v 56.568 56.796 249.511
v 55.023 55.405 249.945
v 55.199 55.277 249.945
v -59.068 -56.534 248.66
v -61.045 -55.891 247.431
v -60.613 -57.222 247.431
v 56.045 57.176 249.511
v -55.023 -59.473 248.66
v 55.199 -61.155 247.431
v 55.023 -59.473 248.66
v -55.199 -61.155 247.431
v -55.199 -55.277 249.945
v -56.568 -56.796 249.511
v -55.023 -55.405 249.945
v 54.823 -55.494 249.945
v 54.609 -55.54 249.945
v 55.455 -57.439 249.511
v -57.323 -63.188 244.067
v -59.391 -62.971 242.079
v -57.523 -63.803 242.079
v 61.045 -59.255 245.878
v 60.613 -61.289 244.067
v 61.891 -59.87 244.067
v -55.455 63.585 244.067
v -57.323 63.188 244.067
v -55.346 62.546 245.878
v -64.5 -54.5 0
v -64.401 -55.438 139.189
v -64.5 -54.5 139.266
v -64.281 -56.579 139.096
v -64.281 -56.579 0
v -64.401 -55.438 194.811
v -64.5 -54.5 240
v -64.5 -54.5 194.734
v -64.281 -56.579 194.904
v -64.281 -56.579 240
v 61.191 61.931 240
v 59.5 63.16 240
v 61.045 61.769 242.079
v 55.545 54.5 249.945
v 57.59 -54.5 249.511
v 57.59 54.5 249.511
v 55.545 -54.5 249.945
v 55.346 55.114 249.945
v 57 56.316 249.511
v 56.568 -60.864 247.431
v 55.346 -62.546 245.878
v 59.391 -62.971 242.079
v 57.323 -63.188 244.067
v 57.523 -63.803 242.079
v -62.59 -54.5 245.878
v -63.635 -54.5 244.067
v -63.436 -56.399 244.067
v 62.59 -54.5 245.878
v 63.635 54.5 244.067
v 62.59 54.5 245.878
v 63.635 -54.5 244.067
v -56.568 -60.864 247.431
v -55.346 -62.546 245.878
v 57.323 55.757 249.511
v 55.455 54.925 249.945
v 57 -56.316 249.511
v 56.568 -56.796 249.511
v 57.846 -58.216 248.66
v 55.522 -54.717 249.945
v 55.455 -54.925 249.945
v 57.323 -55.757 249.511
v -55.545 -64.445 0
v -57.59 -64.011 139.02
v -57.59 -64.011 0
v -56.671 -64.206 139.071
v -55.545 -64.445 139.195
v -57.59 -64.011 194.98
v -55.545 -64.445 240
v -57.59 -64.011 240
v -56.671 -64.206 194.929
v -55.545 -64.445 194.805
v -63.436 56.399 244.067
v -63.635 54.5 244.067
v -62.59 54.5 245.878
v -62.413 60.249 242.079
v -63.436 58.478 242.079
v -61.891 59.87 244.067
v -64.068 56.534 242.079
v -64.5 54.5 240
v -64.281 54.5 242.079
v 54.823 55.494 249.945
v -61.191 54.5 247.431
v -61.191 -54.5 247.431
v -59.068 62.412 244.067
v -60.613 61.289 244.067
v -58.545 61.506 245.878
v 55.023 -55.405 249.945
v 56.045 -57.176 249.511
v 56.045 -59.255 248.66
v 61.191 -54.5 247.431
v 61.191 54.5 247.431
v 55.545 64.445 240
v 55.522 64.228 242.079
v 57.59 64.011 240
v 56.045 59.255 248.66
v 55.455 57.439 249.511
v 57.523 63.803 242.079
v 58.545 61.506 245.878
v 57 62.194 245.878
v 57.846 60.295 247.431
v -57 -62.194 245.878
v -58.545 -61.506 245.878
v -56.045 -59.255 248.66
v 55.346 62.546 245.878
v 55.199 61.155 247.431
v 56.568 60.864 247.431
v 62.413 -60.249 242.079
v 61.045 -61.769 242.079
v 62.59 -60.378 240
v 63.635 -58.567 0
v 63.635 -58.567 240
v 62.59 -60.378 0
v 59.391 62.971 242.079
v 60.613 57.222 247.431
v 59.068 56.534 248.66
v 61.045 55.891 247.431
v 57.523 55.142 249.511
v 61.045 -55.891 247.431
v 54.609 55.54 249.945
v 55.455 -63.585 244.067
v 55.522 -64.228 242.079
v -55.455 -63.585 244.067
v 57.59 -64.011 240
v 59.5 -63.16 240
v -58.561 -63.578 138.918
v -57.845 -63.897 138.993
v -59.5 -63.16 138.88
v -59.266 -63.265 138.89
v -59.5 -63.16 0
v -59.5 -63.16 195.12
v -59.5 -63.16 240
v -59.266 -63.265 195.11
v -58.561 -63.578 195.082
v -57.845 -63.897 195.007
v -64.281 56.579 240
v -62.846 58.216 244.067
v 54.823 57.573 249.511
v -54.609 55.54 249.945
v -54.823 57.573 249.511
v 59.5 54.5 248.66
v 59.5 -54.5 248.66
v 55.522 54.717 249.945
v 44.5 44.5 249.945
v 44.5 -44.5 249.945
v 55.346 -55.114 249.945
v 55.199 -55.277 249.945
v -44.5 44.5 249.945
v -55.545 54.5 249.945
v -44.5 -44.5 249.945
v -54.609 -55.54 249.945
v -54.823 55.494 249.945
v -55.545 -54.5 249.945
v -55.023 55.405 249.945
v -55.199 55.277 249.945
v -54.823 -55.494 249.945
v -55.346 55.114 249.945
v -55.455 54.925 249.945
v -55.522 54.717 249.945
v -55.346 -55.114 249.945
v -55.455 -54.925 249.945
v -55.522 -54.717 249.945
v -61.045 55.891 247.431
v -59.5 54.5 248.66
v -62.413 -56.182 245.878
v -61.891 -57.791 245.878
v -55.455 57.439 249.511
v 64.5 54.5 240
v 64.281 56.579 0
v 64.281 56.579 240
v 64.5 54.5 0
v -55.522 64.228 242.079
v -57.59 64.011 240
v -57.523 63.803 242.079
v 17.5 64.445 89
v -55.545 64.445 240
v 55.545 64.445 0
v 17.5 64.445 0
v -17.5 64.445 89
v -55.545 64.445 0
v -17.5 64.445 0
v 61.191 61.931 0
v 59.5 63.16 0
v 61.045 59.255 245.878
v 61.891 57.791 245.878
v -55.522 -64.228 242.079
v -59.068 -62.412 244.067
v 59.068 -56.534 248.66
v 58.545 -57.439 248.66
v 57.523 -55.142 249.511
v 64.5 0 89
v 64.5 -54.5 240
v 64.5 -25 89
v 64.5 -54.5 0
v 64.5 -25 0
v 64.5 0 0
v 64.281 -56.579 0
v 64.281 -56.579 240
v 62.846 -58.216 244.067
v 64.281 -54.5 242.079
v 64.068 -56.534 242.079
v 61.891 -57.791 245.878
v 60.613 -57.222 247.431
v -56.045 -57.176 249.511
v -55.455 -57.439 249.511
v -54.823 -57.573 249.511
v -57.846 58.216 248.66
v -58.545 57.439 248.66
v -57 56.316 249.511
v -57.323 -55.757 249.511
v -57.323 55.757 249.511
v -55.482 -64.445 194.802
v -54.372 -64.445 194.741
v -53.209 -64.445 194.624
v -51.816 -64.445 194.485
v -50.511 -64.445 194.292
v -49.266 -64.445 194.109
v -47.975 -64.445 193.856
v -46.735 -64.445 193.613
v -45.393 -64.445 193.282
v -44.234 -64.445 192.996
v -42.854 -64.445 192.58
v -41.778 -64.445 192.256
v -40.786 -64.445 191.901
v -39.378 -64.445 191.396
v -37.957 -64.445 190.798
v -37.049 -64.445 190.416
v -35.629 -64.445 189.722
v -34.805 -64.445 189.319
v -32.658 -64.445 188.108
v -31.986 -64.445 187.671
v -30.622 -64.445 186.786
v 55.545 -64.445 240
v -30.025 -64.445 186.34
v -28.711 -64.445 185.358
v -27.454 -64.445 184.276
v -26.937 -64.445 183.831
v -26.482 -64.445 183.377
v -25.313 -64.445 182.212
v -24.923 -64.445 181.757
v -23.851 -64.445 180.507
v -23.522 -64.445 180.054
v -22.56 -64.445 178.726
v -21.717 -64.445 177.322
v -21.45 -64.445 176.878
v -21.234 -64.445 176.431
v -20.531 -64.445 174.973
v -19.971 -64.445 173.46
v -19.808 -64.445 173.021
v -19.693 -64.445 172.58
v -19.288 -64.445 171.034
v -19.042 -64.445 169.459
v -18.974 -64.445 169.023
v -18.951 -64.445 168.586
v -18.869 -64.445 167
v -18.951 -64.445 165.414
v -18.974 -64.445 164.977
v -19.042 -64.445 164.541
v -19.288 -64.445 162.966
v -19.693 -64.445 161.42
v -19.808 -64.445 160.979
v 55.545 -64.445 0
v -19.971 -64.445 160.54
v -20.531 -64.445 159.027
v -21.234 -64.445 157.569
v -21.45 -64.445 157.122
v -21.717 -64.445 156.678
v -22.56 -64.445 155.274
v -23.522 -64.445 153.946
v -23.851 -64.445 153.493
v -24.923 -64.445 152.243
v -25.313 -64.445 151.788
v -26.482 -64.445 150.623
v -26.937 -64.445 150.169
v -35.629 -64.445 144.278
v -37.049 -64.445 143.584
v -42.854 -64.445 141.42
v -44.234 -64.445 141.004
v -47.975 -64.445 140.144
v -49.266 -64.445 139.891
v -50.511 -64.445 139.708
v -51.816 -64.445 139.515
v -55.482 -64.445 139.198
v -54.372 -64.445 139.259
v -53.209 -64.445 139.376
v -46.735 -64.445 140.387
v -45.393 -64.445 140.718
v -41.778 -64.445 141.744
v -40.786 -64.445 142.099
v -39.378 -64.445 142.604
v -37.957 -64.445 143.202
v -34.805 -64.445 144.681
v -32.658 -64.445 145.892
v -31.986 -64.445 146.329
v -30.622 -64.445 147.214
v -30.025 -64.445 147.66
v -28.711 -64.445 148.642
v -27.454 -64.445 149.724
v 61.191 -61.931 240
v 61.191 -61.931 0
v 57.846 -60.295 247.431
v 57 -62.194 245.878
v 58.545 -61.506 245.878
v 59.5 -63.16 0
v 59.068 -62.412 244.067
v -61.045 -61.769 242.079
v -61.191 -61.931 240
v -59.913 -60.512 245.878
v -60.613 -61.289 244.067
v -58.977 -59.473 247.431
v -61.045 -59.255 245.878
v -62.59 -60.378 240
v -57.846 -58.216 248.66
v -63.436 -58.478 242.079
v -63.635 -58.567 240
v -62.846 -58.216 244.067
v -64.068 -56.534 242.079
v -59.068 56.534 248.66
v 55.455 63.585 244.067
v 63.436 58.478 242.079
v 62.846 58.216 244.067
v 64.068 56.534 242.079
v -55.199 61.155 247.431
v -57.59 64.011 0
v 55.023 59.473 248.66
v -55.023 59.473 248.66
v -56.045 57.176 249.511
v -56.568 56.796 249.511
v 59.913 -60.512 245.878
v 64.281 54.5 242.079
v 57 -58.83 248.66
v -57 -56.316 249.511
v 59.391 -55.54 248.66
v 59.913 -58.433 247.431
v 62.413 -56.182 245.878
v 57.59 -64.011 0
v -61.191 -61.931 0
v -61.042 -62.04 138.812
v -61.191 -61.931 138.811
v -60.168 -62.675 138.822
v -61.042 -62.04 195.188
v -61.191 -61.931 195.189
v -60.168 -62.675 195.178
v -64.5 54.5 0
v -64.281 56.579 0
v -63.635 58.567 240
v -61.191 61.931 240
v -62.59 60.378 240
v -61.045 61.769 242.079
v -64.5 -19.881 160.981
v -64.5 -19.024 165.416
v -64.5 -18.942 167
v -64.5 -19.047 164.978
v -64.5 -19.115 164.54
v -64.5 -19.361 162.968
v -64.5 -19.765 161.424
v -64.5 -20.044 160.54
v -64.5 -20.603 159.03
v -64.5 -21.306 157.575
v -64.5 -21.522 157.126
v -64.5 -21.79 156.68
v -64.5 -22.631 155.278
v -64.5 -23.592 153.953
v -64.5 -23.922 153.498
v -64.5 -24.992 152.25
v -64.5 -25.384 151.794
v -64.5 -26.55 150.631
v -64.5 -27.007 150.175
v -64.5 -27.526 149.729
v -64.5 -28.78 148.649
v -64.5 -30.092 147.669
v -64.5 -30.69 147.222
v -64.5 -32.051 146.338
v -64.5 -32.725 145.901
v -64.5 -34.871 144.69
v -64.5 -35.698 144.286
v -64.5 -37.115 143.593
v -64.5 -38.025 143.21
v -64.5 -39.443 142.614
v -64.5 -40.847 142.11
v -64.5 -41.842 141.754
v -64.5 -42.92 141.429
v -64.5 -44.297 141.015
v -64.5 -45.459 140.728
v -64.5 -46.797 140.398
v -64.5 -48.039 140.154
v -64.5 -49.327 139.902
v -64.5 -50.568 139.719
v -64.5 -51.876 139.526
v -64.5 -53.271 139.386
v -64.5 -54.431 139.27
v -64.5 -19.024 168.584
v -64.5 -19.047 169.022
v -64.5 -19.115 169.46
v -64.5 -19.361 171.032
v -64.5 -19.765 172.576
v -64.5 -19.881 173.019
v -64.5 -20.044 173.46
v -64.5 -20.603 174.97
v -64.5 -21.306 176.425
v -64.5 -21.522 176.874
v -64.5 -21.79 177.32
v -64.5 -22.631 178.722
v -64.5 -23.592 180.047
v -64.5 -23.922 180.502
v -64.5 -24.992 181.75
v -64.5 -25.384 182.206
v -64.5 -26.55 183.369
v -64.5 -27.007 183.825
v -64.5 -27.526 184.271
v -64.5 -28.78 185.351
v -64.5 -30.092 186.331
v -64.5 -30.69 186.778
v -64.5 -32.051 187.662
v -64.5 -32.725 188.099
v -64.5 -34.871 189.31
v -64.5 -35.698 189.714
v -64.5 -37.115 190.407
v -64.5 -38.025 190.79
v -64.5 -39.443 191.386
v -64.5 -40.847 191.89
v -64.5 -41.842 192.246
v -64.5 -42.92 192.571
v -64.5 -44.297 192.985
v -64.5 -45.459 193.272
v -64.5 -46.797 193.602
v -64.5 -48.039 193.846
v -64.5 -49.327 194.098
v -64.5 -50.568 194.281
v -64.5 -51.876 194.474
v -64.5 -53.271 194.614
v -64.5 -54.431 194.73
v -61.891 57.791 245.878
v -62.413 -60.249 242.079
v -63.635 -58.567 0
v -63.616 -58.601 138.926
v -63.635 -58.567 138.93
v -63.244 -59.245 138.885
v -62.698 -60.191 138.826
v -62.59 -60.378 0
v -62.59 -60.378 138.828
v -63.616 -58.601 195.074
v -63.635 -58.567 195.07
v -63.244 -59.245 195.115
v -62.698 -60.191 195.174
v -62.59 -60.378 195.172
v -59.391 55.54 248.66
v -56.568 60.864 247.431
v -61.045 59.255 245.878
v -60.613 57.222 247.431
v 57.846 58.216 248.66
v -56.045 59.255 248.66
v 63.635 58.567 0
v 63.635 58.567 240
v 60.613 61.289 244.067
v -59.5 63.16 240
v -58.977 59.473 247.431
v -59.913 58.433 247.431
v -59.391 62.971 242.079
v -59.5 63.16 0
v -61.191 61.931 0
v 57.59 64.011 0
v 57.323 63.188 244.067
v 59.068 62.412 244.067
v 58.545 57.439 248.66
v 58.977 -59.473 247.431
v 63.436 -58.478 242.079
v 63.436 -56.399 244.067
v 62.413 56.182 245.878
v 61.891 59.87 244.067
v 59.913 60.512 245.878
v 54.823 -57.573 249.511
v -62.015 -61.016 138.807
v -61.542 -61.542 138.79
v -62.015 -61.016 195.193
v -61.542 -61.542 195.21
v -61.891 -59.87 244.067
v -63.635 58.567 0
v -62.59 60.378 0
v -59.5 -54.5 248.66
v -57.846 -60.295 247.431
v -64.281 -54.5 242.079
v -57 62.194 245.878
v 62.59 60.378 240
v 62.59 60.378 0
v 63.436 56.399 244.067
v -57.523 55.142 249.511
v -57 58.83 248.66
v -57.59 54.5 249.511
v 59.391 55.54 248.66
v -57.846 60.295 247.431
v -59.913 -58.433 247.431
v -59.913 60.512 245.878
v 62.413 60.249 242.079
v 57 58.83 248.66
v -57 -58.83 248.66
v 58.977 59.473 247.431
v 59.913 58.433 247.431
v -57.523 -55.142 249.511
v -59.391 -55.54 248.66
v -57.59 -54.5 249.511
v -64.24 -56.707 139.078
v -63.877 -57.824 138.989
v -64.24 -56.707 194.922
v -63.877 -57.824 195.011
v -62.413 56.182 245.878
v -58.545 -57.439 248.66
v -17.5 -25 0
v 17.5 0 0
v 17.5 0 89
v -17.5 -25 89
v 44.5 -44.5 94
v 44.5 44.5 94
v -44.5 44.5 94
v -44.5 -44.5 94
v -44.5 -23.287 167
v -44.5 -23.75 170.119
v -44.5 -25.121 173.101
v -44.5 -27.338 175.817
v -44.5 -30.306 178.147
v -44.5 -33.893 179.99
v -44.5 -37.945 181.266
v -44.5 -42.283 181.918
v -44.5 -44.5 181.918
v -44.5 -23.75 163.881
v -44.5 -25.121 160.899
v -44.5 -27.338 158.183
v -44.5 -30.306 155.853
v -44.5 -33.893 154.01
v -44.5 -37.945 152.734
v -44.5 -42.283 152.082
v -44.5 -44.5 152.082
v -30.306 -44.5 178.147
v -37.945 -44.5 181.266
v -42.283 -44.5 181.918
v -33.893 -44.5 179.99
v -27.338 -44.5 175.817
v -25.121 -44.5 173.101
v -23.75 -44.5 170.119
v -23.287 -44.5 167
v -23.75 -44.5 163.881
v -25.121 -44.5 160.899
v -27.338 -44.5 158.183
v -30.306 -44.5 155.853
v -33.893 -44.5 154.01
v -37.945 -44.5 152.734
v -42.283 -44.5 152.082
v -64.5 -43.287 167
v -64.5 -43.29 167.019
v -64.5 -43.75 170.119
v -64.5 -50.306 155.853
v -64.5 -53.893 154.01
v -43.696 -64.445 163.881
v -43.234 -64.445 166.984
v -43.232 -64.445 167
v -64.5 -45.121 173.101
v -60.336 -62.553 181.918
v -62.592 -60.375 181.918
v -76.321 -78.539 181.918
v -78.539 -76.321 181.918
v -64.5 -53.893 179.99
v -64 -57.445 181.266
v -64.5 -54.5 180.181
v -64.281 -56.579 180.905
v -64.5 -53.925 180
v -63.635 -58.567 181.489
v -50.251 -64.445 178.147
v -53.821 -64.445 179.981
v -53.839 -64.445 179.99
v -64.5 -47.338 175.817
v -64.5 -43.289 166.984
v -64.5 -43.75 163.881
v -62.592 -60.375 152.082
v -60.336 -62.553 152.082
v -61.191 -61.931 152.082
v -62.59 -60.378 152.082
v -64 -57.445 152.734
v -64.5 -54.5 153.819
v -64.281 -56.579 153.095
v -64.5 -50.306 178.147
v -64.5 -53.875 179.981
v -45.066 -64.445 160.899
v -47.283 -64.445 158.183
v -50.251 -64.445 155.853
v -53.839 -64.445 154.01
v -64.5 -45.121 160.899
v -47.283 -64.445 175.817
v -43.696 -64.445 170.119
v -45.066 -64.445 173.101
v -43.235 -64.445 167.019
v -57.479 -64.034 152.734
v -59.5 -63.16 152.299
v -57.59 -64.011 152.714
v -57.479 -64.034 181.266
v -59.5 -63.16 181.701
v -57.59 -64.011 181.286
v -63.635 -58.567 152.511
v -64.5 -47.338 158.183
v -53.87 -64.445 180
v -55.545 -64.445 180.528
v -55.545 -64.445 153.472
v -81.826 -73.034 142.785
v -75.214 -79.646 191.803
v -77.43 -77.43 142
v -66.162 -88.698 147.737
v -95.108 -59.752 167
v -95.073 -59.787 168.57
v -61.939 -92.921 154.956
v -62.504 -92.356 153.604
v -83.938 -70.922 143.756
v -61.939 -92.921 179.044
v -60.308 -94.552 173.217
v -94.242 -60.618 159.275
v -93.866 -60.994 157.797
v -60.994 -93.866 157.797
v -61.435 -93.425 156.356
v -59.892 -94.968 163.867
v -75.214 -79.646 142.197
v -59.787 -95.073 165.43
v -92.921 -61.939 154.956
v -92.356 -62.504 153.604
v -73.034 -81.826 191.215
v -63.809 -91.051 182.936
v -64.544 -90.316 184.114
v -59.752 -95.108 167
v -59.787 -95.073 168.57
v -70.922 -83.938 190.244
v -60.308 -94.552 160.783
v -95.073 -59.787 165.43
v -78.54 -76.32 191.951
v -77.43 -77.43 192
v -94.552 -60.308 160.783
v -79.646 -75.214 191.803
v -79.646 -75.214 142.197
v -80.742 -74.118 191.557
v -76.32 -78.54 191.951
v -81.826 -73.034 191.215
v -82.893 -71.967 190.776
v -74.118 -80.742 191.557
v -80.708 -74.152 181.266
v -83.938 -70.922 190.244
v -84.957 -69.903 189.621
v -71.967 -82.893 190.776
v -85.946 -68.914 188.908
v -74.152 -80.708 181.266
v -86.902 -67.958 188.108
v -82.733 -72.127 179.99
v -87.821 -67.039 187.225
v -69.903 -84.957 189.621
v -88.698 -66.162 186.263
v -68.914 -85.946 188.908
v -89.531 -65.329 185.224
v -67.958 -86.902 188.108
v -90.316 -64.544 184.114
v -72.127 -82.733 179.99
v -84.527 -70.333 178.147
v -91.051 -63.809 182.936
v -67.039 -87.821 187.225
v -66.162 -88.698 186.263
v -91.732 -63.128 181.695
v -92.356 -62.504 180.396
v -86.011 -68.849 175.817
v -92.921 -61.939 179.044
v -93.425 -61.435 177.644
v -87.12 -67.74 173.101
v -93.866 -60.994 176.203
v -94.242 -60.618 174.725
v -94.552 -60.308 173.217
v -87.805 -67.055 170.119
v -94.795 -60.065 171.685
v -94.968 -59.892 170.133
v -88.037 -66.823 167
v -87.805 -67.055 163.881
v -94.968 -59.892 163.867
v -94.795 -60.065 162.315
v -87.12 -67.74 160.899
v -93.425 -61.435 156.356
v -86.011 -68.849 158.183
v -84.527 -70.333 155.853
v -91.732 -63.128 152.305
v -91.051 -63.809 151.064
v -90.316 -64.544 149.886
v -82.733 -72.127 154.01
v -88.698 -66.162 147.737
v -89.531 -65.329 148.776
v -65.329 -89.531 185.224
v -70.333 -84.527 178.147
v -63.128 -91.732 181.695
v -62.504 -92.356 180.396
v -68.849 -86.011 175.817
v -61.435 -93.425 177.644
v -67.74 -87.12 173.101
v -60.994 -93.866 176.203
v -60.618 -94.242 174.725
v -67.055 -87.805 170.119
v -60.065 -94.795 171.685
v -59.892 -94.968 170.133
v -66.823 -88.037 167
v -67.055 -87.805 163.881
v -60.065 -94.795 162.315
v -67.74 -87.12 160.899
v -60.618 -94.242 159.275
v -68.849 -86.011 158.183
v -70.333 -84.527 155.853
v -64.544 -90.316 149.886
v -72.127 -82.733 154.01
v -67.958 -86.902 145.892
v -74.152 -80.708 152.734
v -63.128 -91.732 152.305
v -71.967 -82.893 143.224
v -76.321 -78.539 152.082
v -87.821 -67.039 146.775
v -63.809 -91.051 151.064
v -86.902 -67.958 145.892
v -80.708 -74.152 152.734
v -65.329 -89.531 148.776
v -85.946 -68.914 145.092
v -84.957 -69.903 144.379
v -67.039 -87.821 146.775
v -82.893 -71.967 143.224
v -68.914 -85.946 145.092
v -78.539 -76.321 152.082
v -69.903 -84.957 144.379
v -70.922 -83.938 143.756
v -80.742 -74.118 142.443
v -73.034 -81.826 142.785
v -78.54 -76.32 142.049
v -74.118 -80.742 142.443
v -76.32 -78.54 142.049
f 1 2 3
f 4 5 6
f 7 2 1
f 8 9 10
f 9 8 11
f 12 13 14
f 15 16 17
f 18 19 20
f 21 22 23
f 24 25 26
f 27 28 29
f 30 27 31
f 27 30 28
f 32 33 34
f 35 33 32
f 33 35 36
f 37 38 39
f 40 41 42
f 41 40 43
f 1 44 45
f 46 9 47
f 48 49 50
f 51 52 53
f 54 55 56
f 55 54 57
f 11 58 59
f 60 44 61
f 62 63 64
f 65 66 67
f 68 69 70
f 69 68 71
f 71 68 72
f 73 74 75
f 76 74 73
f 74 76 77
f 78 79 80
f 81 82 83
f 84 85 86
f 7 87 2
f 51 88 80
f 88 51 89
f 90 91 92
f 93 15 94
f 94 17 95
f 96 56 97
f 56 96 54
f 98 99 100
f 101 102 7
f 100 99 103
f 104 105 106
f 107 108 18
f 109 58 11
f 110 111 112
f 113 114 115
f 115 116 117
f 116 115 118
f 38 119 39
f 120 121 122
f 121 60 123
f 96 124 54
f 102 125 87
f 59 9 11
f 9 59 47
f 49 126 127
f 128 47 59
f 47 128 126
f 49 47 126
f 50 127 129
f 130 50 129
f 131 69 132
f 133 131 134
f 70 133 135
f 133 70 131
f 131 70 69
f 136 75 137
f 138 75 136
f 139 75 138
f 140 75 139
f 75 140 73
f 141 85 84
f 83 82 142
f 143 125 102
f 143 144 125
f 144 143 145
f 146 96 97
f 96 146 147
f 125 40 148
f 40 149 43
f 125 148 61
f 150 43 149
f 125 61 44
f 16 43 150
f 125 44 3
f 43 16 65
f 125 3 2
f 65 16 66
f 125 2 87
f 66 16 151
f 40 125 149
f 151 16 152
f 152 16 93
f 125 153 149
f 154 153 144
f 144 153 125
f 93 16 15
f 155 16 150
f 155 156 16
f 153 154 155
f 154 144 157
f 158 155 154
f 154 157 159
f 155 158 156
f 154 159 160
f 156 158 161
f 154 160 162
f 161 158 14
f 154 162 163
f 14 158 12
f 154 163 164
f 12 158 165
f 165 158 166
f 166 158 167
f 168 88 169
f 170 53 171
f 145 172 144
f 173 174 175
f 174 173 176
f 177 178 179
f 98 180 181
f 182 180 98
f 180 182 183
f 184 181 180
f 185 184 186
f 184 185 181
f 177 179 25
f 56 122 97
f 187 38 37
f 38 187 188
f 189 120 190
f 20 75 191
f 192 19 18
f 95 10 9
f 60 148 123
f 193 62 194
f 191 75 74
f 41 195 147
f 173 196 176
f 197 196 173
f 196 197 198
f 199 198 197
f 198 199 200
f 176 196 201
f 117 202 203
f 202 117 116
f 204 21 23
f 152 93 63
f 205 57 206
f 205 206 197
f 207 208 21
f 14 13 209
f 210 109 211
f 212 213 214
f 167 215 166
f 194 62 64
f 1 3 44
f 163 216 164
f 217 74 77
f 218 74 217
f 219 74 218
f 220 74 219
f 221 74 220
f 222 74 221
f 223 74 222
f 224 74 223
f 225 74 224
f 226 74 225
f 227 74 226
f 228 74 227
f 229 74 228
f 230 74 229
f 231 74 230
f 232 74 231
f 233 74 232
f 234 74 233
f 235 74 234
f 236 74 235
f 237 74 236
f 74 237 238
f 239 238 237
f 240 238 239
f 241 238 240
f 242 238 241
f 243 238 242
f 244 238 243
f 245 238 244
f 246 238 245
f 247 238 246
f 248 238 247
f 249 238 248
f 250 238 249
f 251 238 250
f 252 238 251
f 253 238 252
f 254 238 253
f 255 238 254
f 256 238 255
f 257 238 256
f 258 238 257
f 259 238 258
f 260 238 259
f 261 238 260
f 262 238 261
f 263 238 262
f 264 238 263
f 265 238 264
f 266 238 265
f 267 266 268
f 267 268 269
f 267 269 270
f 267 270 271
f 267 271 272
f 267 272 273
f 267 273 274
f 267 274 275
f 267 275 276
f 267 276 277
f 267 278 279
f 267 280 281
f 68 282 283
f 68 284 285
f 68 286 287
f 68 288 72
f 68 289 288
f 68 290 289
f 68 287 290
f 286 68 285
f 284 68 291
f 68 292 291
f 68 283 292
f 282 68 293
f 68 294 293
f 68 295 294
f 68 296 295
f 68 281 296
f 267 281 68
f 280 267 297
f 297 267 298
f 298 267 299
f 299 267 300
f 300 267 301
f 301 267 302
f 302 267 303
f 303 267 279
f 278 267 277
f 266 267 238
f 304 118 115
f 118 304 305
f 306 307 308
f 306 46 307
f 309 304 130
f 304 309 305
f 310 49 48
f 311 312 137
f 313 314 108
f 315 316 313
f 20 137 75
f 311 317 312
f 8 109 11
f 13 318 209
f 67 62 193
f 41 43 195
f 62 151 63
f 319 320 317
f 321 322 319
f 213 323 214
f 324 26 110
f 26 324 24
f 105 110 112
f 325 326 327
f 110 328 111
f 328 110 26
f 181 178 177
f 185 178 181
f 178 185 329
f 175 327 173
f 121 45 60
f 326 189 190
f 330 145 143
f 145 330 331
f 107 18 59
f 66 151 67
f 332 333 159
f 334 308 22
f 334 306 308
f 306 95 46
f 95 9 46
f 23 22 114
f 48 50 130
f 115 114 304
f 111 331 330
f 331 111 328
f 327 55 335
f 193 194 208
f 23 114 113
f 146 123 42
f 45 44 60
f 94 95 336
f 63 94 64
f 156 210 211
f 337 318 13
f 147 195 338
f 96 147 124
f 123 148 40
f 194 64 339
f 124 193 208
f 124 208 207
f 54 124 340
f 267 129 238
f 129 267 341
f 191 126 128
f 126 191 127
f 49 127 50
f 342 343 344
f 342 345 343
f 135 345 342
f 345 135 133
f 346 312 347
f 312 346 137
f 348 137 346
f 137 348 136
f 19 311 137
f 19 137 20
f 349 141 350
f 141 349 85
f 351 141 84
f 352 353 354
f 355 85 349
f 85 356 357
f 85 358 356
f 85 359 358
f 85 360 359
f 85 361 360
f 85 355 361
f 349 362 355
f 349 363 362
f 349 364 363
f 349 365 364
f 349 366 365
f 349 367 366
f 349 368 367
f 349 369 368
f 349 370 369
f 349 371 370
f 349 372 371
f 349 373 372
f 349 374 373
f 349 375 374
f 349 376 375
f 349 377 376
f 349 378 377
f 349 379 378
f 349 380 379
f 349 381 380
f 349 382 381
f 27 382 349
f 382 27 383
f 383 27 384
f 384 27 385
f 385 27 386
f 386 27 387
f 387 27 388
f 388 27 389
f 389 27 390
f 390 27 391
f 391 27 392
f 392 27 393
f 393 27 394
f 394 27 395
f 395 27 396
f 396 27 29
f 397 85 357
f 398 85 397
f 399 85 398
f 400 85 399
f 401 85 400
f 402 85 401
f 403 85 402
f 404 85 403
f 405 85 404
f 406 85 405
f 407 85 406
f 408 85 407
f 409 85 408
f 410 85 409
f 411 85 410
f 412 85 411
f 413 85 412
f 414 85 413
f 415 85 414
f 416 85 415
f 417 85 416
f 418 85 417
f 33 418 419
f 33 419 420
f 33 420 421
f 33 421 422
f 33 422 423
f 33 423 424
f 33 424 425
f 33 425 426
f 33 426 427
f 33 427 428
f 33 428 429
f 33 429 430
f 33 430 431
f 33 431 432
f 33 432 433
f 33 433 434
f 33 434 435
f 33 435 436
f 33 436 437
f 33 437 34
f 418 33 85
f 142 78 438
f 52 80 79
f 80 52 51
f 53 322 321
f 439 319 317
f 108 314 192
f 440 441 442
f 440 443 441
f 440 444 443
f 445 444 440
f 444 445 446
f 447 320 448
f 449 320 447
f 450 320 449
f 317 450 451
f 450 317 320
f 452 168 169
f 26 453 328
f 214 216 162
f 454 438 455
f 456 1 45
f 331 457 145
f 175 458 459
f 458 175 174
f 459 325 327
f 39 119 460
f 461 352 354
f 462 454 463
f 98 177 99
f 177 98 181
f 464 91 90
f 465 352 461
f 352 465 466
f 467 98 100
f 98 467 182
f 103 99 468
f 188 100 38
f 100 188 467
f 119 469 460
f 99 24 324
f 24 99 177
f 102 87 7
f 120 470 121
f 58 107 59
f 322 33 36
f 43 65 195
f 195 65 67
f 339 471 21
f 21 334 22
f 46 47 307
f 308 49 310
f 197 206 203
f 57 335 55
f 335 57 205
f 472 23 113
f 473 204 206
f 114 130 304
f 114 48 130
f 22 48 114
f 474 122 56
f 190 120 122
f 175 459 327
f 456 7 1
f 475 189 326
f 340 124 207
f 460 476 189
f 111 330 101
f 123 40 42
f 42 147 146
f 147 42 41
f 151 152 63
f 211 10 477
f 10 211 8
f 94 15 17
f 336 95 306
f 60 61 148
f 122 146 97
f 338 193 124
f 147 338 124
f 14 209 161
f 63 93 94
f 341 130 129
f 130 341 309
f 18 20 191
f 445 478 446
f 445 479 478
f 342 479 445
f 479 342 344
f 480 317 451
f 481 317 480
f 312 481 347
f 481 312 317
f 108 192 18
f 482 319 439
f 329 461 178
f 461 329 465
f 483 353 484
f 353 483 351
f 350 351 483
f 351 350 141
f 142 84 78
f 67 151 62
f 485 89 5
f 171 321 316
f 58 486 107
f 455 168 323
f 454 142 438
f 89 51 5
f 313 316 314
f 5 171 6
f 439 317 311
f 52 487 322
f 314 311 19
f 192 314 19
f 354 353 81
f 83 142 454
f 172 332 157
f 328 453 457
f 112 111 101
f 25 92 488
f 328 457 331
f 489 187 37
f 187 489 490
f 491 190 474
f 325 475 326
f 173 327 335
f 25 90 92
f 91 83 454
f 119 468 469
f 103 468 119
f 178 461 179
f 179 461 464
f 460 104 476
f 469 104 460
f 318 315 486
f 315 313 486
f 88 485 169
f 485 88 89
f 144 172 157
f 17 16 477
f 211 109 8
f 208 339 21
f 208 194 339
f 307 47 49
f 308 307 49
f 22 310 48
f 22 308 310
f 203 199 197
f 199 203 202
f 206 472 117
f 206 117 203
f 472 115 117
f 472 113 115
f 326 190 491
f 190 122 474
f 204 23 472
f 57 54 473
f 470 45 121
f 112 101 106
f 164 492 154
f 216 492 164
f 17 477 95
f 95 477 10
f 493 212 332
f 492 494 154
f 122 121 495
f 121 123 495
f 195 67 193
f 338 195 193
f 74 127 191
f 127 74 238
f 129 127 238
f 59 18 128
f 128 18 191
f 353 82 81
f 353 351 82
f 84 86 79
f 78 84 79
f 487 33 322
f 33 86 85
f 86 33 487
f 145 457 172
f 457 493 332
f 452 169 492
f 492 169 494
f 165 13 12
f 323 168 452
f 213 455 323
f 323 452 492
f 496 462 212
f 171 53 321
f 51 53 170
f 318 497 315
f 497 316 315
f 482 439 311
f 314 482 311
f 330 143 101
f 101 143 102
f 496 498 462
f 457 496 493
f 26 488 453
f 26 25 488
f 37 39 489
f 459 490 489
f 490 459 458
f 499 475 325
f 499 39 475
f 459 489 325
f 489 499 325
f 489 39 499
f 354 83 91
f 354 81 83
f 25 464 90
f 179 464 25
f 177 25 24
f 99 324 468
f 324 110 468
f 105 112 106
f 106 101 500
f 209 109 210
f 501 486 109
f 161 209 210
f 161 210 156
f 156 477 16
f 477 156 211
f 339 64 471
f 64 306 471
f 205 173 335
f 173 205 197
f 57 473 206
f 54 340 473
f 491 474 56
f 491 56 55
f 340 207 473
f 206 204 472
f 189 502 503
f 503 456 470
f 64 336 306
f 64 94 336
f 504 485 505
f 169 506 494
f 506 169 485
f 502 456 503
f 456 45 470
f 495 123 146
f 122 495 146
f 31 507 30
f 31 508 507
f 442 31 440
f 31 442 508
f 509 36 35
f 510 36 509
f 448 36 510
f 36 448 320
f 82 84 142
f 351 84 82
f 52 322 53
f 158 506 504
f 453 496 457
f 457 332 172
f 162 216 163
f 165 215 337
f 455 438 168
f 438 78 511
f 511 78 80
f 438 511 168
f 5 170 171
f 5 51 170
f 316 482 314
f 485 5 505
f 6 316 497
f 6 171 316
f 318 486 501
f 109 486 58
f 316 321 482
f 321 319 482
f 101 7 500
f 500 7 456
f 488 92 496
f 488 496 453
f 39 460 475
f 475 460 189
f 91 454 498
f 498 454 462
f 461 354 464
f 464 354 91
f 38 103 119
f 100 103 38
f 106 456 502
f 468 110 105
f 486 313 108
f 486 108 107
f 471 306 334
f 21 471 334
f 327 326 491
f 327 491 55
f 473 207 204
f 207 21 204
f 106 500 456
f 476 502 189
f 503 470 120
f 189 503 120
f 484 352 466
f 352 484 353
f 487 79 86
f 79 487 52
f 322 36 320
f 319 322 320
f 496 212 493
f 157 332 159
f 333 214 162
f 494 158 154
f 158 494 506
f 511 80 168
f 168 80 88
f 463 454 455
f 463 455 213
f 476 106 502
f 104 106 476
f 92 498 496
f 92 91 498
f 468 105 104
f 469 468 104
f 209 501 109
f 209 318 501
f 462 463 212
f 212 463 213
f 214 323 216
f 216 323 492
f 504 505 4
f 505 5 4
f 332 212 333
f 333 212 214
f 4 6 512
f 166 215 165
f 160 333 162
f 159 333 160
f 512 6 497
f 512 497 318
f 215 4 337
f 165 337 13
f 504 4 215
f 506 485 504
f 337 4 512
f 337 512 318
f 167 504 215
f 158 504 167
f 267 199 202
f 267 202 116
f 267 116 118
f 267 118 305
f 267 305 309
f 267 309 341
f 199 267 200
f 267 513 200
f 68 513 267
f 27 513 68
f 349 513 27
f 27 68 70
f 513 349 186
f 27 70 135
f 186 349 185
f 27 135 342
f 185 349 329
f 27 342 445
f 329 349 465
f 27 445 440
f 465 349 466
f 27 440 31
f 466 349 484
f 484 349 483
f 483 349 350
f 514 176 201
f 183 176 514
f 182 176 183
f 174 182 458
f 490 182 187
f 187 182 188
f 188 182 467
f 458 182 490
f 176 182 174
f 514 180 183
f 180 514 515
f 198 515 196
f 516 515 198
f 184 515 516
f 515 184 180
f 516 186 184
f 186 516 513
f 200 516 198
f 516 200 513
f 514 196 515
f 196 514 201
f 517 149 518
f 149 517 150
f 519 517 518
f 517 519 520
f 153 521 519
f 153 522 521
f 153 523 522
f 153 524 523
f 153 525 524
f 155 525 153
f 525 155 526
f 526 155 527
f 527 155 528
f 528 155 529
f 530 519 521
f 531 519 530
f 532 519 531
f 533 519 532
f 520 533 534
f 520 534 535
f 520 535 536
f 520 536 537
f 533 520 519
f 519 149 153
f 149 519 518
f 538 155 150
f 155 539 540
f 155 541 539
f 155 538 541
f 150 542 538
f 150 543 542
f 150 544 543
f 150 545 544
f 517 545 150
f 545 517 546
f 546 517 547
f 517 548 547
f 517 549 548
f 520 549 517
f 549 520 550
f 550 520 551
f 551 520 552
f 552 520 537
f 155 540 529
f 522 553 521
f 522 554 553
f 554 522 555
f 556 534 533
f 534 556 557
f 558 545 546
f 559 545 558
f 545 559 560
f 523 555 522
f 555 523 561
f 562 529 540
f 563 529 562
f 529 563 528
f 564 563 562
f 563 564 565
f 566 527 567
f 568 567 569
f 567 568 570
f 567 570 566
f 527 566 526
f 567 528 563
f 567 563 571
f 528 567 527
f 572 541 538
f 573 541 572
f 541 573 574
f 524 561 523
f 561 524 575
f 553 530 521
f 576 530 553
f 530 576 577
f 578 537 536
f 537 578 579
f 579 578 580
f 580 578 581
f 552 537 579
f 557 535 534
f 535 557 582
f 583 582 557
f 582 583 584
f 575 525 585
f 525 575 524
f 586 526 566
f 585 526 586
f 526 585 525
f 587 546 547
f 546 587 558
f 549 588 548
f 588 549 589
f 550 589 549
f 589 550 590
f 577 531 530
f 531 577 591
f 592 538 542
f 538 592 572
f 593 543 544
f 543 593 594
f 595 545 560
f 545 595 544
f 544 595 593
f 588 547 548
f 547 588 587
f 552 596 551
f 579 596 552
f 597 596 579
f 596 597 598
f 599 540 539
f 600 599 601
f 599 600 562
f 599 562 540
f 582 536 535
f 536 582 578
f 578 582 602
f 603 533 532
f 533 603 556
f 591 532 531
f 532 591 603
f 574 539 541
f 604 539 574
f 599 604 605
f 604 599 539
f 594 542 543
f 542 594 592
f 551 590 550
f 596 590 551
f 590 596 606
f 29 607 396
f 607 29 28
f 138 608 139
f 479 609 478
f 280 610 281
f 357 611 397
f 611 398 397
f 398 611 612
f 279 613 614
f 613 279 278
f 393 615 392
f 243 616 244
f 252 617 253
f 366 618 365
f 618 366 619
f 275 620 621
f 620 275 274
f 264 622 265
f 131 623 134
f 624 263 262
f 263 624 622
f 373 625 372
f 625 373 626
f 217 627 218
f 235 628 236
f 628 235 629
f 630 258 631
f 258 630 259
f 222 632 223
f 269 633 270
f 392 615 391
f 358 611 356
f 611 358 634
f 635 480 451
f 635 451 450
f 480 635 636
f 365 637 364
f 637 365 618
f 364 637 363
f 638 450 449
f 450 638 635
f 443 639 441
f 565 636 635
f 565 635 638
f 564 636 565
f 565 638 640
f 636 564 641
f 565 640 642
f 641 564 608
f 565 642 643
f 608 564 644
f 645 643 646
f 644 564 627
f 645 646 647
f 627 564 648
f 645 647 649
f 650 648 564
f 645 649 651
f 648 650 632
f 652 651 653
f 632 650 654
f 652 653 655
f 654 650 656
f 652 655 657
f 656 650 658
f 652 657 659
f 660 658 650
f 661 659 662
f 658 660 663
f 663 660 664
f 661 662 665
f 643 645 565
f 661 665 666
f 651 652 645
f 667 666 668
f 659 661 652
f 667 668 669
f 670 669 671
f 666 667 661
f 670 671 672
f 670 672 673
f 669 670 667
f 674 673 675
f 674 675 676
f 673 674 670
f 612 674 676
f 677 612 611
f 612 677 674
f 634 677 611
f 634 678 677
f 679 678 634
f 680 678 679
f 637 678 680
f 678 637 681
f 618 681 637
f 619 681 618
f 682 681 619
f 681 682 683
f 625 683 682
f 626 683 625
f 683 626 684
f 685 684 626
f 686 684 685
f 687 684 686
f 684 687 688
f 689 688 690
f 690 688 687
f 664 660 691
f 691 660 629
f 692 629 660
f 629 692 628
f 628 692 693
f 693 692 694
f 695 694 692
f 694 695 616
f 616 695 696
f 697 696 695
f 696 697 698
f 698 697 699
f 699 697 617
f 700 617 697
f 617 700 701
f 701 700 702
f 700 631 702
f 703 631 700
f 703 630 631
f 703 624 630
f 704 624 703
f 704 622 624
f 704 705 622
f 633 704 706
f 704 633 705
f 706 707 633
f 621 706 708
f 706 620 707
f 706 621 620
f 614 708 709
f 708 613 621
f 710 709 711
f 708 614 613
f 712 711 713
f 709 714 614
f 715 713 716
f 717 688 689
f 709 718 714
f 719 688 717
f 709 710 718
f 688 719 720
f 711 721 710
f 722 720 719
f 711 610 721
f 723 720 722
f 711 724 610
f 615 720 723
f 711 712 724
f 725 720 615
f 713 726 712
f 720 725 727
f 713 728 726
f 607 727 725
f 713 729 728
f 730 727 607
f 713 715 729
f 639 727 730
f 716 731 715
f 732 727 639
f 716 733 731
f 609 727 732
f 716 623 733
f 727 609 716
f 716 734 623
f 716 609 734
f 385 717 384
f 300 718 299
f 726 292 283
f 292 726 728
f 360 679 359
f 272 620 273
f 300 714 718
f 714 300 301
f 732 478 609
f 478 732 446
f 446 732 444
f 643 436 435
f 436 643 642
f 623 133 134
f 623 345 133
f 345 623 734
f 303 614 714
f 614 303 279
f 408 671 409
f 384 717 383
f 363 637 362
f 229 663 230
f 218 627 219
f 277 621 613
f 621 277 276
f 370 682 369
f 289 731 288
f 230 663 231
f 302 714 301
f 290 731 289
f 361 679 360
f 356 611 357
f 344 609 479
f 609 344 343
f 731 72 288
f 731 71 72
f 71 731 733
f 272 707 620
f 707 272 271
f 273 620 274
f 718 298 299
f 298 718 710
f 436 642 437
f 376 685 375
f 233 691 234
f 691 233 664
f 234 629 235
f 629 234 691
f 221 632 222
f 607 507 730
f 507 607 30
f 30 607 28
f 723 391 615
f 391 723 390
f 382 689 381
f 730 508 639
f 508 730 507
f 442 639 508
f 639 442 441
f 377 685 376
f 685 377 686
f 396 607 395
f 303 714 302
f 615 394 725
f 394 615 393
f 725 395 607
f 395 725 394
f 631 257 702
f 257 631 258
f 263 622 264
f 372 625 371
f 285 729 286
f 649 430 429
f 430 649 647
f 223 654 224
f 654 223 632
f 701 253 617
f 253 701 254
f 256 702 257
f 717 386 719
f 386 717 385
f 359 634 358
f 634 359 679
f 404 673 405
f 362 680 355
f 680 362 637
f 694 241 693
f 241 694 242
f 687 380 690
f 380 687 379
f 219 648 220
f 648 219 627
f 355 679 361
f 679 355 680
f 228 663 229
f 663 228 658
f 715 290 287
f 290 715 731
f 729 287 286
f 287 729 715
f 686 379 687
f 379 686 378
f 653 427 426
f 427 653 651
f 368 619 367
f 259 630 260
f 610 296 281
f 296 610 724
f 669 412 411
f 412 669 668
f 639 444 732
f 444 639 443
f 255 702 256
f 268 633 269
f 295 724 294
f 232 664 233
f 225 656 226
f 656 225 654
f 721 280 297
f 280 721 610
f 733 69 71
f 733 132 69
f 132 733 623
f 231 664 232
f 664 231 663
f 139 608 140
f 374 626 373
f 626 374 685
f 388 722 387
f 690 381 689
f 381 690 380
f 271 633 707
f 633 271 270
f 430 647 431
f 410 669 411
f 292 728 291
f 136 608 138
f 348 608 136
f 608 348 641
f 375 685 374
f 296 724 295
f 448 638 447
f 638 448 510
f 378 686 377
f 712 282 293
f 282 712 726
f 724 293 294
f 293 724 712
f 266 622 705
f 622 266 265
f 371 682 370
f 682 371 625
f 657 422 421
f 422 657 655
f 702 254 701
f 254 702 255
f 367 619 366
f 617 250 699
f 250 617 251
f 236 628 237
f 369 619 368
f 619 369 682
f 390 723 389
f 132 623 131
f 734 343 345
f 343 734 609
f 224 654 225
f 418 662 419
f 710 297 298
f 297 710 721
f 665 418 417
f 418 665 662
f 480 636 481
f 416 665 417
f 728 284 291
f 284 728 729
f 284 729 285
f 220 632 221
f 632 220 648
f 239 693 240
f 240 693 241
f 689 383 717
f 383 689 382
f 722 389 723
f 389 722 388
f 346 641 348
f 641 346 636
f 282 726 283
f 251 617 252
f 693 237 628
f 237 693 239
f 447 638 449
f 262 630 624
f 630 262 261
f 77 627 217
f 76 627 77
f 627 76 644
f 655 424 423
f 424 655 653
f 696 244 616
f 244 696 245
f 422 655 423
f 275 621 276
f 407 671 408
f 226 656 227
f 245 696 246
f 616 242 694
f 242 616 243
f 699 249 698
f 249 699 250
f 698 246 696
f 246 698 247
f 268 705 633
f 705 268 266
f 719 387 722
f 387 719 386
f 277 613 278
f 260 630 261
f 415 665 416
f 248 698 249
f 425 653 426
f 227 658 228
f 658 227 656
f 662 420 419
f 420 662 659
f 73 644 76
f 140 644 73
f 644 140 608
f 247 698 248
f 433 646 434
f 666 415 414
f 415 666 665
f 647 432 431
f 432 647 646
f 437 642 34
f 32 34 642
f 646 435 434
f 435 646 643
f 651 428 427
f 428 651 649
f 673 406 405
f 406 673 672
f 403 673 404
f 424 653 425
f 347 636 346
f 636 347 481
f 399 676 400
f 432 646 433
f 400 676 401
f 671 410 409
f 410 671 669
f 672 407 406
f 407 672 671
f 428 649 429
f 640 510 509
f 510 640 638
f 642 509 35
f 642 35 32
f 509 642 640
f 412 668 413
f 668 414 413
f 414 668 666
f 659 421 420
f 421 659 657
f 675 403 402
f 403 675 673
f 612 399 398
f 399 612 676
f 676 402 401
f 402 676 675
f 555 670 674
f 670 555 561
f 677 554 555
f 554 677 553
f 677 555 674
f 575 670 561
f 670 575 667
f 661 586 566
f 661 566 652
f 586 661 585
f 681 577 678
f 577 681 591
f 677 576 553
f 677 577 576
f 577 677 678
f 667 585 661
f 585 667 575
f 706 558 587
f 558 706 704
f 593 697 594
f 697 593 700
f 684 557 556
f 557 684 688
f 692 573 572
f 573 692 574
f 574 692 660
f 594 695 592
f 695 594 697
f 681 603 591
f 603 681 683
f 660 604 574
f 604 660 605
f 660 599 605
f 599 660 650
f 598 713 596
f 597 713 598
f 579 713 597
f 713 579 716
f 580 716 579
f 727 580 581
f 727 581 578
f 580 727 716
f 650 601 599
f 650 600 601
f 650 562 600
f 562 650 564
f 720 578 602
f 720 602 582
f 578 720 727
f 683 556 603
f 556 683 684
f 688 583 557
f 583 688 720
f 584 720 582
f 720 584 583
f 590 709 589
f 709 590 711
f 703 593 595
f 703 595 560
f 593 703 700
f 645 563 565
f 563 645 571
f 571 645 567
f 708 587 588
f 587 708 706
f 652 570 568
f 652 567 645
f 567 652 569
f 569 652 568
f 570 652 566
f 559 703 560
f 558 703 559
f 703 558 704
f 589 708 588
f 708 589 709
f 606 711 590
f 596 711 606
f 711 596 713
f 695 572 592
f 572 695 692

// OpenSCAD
detail = 300;
postWidth = 89;
wallThickness = 20;
cornerRadius = 10;
boardHeight = 89;

coneHeight = 70;
coneBoar = 15;
coneWallThickness = 10;

thickRadius = coneBoar+coneWallThickness+10;
thinRadius = coneBoar+coneWallThickness;

sphereAccuracy = 100;
deflection = coneHeight/sqrt(2);
centerToCorner = (postWidth * sqrt(2))/2;
bottomPlate = 5;
coneRotation = 90;
height = 240;
coneDist = ((height - (boardHeight+bottomPlate)) / 2) + boardHeight+bottomPlate;


module block() {
    difference(){
        minkowski(){
            translate([-(postWidth + wallThickness) / 2, -(postWidth + wallThickness) / 2, 0])
                cube([postWidth + wallThickness, postWidth + wallThickness, height]);
            sphere(10);
        }
        translate([-(postWidth + wallThickness + cornerRadius*2) / 2, -(postWidth + wallThickness+ cornerRadius*2) / 2, -cornerRadius])
                cube([postWidth + wallThickness + cornerRadius*2, postWidth + wallThickness + cornerRadius*2, cornerRadius]);
    }
}

module cone() {
    cylinder(coneHeight, thinRadius, thickRadius, $fn = sphereAccuracy);
}

module tappedCone(){
    difference(){
        cone();
        translate([0,0,-1])
        cylinder(coneHeight, coneBoar, coneBoar, sphereAccuracy);
    }
}


difference() {
    block();

    // First slot (Y-axis)
    translate([-thickRadius / 2, -thinRadius, -1])
        cube([thickRadius, 900, boardHeight+1]);

    // Second slot (X-axis)
    translate([-thickRadius/2, -thinRadius, -1])
        cube([900, thinRadius, boardHeight+1]);
    
    translate([-postWidth / 2, -postWidth / 2, boardHeight+bottomPlate])
    color("red", 0.3)
        cube([postWidth , postWidth, 178]);
     translate([-deflection - centerToCorner + (thickRadius * tan(45)),
                -deflection - centerToCorner + (thickRadius * tan(45)),
            coneDist])
        rotate([coneRotation,0,135])
        cylinder(coneHeight, coneBoar, coneBoar, sphereAccuracy);

}
difference(){
 translate([-deflection - centerToCorner + (thickRadius * tan(45)),
            -deflection - centerToCorner + (thickRadius * tan(45)),
            coneDist])
        rotate([coneRotation,0,135])
        tappedCone();
    block();
}

//block();

//translate([-postWidth / 2, -postWidth / 2, boardHeight+bottomPlate])
//    color("red", 0.3)
//        cube([postWidth , postWidth, 178]);
//translate([-(postWidth + wallThickness) / 2, -(postWidth + wallThickness) / 2, -cornerRadius])
//    color("red", 0.3)
//    cube([postWidth + wallThickness, postWidth + wallThickness, cornerRadius]);
